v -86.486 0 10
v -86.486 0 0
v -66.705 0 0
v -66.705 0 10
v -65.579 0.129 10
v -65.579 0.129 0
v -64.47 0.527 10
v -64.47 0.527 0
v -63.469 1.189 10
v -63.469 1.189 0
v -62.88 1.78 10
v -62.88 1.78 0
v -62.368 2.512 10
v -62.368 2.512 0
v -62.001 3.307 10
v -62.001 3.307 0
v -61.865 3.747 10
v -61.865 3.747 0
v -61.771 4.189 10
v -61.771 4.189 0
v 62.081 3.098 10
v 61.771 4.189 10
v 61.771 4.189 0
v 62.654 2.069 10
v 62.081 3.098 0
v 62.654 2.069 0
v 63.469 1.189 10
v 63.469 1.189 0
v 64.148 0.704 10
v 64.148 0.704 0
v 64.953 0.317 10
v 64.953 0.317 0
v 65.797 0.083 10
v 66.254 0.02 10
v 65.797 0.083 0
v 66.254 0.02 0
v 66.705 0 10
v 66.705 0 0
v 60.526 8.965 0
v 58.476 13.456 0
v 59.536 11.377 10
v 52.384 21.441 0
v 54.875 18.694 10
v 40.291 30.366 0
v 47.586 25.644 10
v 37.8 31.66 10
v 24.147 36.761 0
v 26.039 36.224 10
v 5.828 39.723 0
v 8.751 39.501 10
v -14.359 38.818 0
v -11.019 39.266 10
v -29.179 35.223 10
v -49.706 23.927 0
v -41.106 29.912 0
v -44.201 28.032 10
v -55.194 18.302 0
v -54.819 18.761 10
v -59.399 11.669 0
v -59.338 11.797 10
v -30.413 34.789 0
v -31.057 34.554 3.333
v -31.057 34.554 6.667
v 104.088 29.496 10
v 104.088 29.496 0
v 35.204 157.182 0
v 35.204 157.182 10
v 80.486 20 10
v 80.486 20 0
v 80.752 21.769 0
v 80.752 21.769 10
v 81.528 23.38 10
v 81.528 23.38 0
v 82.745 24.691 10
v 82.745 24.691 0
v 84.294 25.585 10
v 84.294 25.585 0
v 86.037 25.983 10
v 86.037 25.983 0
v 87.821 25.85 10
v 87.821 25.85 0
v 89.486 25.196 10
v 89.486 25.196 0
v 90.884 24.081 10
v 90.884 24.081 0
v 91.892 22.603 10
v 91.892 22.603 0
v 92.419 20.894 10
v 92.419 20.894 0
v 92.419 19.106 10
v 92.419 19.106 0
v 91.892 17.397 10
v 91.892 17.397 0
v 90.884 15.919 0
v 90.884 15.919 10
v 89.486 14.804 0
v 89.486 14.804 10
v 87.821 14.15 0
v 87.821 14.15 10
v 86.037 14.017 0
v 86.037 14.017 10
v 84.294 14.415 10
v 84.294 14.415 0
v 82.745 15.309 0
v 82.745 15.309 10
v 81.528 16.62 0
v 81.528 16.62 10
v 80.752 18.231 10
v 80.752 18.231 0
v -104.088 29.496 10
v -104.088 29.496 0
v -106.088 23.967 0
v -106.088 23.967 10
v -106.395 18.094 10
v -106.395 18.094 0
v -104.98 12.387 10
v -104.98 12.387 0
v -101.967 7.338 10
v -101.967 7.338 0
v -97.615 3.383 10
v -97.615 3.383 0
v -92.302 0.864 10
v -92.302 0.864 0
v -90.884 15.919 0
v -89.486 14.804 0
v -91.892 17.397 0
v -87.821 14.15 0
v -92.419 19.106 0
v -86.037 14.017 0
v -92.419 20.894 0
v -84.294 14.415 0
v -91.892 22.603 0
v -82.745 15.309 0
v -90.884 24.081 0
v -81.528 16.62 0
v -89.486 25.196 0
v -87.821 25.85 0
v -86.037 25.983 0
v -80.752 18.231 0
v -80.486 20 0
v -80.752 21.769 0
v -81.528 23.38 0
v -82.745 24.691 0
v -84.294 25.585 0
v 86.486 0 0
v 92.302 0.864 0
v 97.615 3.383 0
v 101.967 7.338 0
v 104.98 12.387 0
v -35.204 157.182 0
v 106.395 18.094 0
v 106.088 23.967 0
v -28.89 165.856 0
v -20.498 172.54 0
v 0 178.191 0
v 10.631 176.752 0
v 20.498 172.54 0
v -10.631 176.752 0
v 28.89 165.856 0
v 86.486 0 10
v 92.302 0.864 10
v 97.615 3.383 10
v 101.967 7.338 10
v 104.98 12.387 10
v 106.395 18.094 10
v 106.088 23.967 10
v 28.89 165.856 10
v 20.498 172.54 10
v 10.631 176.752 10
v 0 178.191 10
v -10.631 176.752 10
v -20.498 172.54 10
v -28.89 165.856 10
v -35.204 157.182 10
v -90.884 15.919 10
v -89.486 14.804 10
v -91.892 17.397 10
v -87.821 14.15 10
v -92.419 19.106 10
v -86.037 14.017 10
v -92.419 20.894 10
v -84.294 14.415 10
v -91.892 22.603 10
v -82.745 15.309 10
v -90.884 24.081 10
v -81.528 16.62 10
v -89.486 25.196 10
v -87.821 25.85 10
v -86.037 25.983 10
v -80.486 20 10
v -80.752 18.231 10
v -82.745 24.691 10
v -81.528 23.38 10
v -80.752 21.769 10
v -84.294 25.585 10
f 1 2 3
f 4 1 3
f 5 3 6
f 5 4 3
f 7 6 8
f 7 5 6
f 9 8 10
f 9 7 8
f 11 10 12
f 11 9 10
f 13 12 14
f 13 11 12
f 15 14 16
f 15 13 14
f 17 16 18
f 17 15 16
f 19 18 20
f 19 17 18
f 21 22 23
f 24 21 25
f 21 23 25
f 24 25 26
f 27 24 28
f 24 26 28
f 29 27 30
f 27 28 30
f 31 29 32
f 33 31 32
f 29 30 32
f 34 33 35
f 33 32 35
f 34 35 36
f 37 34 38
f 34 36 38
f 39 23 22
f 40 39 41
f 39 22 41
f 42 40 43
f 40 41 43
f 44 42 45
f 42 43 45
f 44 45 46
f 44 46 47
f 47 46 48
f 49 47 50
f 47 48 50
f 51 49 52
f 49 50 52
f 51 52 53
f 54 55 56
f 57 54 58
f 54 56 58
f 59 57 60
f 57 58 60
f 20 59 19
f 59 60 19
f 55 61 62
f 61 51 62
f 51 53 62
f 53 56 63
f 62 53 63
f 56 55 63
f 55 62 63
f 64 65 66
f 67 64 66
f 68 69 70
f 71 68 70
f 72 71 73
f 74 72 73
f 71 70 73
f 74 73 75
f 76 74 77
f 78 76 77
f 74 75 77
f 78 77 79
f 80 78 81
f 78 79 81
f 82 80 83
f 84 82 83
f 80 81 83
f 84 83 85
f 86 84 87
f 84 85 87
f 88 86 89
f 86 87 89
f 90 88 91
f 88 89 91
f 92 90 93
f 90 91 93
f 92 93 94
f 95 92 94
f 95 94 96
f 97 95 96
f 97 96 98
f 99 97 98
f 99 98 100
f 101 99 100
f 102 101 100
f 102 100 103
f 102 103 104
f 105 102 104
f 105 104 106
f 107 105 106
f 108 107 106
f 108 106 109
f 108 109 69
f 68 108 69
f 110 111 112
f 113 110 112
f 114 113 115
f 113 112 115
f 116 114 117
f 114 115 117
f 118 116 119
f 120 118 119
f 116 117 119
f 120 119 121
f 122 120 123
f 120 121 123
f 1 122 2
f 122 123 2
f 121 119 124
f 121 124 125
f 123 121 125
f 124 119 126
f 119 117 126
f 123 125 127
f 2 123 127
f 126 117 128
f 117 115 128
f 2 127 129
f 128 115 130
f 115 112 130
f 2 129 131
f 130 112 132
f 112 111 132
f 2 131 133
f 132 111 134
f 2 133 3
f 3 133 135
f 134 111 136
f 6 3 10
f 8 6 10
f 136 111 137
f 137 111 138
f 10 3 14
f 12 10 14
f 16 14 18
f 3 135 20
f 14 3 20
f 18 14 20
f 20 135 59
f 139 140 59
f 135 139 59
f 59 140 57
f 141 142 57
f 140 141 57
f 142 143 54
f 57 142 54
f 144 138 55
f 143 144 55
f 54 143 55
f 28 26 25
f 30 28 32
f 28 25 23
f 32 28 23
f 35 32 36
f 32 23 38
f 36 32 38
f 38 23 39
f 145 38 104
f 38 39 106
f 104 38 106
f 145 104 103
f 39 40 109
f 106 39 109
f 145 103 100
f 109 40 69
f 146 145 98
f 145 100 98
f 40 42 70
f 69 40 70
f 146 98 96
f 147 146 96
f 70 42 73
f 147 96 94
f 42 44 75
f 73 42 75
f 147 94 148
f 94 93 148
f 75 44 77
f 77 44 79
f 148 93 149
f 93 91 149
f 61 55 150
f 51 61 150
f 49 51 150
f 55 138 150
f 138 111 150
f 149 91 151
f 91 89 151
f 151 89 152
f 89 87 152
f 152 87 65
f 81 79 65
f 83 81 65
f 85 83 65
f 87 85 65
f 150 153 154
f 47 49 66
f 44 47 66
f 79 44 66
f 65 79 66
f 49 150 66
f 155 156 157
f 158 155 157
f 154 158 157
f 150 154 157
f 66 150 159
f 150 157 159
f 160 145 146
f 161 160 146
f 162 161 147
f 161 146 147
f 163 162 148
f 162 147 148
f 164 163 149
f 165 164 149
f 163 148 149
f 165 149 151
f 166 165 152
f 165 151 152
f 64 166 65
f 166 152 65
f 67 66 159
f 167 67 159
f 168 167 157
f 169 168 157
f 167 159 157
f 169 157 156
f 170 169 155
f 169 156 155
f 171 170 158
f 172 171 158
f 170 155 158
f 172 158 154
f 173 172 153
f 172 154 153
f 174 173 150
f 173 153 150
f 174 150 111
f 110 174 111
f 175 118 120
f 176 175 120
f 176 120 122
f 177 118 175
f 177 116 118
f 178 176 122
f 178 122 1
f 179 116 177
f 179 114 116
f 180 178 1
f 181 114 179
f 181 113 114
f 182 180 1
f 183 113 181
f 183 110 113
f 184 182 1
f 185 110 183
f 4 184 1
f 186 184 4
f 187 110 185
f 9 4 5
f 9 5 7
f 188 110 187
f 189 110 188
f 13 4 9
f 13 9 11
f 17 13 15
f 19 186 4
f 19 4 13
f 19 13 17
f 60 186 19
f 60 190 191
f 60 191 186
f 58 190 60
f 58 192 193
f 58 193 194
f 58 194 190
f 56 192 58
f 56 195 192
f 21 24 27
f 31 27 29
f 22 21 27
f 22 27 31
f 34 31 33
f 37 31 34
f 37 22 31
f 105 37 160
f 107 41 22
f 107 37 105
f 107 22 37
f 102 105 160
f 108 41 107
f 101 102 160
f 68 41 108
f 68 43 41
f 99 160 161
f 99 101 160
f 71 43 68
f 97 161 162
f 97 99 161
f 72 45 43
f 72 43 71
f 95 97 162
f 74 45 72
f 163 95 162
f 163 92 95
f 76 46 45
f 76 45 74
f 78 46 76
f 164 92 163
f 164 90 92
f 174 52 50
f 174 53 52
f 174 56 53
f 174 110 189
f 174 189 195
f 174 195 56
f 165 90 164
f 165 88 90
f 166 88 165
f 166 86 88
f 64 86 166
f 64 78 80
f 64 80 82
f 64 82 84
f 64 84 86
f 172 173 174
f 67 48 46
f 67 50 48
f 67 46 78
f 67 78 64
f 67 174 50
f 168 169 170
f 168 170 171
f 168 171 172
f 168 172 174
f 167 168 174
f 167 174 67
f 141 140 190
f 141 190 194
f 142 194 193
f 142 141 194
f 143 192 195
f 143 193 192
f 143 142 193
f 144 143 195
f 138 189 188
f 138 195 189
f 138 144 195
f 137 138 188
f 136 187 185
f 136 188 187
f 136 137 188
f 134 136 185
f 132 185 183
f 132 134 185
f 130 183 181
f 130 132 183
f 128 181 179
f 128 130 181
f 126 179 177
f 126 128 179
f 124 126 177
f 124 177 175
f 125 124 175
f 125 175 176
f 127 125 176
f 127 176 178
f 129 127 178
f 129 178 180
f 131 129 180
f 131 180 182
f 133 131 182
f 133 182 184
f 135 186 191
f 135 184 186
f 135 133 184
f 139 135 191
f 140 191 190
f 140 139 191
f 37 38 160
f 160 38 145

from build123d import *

# Parameters (mm, degrees)
F1_DEPTH = 10
F3_D     = 12
F5_DEPTH = 25
F6_R     = 5


# Not quite as in the source:
# - a pattern or mirror of a feature is missing from the dataset's text; its kind, count and spacing are read off the source's solid


with BuildPart() as f1:
    # F0 (on Top) → F1 (new body)
    with BuildSketch(Plane.XY):
        with BuildLine():
            Line((-86.4857615178, 0), (0, 0))
            Line((0, 0), (86.4857615178, 0))
            ThreePointArc((86.4857615178, 0), (103.6601107493, 9.7510132951), (104.0877292116, 29.4958271523))
            Line((104.0877292116, 29.4958271523), (35.2039353876, 157.1824724621))
            ThreePointArc((35.2039353876, 157.1824724621), (0, 178.1908181575), (-35.2039353876, 157.1824724621))
            Line((-35.2039353876, 157.1824724621), (-104.0877292116, 29.4958271523))
            ThreePointArc((-104.0877292116, 29.4958271523), (-103.6601107493, 9.7510132951), (-86.4857615178, 0))
        make_face()
    extrude(amount=F1_DEPTH)

    # F3 (through all)
    with Locations(Plane.XY.offset(10)):
        with Locations((86.4857615178, 20)):
            f3 = Hole(F3_D / 2)

    # F3_copies: F3 across plane
    add(f3.mirror(Plane(origin=(0, 0, 0), x_dir=(0, 0, -1), z_dir=(-1, 0, 0))), mode=Mode.SUBTRACT)

    # F4 (on face) → F5 (cut)
    with BuildSketch(Plane.XY.offset(10)):
        with BuildLine():
            add(Edge.make_bspline(
                [(62.1145702899, 0), (62.1145702899, 69.1070951712), (-31.0572851449, 34.5535475856), (-124.2291405797, 0), (-31.0572851449, -34.5535475856), (62.1145702899, -69.1070951712), (62.1145702899, 0)],
                knots=[0, 0, 0, 2.0943951024, 2.0943951024, 4.1887902048, 4.1887902048, 6.2831853072, 6.2831853072, 6.2831853072], degree=2, weights=[1, 0.5, 1, 0.5, 1, 0.5, 1]))
        make_face()
    extrude(amount=-F5_DEPTH, mode=Mode.SUBTRACT)

    # F6
    f6_edges = [f1.edges().sort_by_distance(p)[0] for p in [
        (-62.11457, 0, 5),
        (62.11457, 0, 5),
    ]]
    fillet(f6_edges, radius=F6_R)


solid = f1.part
